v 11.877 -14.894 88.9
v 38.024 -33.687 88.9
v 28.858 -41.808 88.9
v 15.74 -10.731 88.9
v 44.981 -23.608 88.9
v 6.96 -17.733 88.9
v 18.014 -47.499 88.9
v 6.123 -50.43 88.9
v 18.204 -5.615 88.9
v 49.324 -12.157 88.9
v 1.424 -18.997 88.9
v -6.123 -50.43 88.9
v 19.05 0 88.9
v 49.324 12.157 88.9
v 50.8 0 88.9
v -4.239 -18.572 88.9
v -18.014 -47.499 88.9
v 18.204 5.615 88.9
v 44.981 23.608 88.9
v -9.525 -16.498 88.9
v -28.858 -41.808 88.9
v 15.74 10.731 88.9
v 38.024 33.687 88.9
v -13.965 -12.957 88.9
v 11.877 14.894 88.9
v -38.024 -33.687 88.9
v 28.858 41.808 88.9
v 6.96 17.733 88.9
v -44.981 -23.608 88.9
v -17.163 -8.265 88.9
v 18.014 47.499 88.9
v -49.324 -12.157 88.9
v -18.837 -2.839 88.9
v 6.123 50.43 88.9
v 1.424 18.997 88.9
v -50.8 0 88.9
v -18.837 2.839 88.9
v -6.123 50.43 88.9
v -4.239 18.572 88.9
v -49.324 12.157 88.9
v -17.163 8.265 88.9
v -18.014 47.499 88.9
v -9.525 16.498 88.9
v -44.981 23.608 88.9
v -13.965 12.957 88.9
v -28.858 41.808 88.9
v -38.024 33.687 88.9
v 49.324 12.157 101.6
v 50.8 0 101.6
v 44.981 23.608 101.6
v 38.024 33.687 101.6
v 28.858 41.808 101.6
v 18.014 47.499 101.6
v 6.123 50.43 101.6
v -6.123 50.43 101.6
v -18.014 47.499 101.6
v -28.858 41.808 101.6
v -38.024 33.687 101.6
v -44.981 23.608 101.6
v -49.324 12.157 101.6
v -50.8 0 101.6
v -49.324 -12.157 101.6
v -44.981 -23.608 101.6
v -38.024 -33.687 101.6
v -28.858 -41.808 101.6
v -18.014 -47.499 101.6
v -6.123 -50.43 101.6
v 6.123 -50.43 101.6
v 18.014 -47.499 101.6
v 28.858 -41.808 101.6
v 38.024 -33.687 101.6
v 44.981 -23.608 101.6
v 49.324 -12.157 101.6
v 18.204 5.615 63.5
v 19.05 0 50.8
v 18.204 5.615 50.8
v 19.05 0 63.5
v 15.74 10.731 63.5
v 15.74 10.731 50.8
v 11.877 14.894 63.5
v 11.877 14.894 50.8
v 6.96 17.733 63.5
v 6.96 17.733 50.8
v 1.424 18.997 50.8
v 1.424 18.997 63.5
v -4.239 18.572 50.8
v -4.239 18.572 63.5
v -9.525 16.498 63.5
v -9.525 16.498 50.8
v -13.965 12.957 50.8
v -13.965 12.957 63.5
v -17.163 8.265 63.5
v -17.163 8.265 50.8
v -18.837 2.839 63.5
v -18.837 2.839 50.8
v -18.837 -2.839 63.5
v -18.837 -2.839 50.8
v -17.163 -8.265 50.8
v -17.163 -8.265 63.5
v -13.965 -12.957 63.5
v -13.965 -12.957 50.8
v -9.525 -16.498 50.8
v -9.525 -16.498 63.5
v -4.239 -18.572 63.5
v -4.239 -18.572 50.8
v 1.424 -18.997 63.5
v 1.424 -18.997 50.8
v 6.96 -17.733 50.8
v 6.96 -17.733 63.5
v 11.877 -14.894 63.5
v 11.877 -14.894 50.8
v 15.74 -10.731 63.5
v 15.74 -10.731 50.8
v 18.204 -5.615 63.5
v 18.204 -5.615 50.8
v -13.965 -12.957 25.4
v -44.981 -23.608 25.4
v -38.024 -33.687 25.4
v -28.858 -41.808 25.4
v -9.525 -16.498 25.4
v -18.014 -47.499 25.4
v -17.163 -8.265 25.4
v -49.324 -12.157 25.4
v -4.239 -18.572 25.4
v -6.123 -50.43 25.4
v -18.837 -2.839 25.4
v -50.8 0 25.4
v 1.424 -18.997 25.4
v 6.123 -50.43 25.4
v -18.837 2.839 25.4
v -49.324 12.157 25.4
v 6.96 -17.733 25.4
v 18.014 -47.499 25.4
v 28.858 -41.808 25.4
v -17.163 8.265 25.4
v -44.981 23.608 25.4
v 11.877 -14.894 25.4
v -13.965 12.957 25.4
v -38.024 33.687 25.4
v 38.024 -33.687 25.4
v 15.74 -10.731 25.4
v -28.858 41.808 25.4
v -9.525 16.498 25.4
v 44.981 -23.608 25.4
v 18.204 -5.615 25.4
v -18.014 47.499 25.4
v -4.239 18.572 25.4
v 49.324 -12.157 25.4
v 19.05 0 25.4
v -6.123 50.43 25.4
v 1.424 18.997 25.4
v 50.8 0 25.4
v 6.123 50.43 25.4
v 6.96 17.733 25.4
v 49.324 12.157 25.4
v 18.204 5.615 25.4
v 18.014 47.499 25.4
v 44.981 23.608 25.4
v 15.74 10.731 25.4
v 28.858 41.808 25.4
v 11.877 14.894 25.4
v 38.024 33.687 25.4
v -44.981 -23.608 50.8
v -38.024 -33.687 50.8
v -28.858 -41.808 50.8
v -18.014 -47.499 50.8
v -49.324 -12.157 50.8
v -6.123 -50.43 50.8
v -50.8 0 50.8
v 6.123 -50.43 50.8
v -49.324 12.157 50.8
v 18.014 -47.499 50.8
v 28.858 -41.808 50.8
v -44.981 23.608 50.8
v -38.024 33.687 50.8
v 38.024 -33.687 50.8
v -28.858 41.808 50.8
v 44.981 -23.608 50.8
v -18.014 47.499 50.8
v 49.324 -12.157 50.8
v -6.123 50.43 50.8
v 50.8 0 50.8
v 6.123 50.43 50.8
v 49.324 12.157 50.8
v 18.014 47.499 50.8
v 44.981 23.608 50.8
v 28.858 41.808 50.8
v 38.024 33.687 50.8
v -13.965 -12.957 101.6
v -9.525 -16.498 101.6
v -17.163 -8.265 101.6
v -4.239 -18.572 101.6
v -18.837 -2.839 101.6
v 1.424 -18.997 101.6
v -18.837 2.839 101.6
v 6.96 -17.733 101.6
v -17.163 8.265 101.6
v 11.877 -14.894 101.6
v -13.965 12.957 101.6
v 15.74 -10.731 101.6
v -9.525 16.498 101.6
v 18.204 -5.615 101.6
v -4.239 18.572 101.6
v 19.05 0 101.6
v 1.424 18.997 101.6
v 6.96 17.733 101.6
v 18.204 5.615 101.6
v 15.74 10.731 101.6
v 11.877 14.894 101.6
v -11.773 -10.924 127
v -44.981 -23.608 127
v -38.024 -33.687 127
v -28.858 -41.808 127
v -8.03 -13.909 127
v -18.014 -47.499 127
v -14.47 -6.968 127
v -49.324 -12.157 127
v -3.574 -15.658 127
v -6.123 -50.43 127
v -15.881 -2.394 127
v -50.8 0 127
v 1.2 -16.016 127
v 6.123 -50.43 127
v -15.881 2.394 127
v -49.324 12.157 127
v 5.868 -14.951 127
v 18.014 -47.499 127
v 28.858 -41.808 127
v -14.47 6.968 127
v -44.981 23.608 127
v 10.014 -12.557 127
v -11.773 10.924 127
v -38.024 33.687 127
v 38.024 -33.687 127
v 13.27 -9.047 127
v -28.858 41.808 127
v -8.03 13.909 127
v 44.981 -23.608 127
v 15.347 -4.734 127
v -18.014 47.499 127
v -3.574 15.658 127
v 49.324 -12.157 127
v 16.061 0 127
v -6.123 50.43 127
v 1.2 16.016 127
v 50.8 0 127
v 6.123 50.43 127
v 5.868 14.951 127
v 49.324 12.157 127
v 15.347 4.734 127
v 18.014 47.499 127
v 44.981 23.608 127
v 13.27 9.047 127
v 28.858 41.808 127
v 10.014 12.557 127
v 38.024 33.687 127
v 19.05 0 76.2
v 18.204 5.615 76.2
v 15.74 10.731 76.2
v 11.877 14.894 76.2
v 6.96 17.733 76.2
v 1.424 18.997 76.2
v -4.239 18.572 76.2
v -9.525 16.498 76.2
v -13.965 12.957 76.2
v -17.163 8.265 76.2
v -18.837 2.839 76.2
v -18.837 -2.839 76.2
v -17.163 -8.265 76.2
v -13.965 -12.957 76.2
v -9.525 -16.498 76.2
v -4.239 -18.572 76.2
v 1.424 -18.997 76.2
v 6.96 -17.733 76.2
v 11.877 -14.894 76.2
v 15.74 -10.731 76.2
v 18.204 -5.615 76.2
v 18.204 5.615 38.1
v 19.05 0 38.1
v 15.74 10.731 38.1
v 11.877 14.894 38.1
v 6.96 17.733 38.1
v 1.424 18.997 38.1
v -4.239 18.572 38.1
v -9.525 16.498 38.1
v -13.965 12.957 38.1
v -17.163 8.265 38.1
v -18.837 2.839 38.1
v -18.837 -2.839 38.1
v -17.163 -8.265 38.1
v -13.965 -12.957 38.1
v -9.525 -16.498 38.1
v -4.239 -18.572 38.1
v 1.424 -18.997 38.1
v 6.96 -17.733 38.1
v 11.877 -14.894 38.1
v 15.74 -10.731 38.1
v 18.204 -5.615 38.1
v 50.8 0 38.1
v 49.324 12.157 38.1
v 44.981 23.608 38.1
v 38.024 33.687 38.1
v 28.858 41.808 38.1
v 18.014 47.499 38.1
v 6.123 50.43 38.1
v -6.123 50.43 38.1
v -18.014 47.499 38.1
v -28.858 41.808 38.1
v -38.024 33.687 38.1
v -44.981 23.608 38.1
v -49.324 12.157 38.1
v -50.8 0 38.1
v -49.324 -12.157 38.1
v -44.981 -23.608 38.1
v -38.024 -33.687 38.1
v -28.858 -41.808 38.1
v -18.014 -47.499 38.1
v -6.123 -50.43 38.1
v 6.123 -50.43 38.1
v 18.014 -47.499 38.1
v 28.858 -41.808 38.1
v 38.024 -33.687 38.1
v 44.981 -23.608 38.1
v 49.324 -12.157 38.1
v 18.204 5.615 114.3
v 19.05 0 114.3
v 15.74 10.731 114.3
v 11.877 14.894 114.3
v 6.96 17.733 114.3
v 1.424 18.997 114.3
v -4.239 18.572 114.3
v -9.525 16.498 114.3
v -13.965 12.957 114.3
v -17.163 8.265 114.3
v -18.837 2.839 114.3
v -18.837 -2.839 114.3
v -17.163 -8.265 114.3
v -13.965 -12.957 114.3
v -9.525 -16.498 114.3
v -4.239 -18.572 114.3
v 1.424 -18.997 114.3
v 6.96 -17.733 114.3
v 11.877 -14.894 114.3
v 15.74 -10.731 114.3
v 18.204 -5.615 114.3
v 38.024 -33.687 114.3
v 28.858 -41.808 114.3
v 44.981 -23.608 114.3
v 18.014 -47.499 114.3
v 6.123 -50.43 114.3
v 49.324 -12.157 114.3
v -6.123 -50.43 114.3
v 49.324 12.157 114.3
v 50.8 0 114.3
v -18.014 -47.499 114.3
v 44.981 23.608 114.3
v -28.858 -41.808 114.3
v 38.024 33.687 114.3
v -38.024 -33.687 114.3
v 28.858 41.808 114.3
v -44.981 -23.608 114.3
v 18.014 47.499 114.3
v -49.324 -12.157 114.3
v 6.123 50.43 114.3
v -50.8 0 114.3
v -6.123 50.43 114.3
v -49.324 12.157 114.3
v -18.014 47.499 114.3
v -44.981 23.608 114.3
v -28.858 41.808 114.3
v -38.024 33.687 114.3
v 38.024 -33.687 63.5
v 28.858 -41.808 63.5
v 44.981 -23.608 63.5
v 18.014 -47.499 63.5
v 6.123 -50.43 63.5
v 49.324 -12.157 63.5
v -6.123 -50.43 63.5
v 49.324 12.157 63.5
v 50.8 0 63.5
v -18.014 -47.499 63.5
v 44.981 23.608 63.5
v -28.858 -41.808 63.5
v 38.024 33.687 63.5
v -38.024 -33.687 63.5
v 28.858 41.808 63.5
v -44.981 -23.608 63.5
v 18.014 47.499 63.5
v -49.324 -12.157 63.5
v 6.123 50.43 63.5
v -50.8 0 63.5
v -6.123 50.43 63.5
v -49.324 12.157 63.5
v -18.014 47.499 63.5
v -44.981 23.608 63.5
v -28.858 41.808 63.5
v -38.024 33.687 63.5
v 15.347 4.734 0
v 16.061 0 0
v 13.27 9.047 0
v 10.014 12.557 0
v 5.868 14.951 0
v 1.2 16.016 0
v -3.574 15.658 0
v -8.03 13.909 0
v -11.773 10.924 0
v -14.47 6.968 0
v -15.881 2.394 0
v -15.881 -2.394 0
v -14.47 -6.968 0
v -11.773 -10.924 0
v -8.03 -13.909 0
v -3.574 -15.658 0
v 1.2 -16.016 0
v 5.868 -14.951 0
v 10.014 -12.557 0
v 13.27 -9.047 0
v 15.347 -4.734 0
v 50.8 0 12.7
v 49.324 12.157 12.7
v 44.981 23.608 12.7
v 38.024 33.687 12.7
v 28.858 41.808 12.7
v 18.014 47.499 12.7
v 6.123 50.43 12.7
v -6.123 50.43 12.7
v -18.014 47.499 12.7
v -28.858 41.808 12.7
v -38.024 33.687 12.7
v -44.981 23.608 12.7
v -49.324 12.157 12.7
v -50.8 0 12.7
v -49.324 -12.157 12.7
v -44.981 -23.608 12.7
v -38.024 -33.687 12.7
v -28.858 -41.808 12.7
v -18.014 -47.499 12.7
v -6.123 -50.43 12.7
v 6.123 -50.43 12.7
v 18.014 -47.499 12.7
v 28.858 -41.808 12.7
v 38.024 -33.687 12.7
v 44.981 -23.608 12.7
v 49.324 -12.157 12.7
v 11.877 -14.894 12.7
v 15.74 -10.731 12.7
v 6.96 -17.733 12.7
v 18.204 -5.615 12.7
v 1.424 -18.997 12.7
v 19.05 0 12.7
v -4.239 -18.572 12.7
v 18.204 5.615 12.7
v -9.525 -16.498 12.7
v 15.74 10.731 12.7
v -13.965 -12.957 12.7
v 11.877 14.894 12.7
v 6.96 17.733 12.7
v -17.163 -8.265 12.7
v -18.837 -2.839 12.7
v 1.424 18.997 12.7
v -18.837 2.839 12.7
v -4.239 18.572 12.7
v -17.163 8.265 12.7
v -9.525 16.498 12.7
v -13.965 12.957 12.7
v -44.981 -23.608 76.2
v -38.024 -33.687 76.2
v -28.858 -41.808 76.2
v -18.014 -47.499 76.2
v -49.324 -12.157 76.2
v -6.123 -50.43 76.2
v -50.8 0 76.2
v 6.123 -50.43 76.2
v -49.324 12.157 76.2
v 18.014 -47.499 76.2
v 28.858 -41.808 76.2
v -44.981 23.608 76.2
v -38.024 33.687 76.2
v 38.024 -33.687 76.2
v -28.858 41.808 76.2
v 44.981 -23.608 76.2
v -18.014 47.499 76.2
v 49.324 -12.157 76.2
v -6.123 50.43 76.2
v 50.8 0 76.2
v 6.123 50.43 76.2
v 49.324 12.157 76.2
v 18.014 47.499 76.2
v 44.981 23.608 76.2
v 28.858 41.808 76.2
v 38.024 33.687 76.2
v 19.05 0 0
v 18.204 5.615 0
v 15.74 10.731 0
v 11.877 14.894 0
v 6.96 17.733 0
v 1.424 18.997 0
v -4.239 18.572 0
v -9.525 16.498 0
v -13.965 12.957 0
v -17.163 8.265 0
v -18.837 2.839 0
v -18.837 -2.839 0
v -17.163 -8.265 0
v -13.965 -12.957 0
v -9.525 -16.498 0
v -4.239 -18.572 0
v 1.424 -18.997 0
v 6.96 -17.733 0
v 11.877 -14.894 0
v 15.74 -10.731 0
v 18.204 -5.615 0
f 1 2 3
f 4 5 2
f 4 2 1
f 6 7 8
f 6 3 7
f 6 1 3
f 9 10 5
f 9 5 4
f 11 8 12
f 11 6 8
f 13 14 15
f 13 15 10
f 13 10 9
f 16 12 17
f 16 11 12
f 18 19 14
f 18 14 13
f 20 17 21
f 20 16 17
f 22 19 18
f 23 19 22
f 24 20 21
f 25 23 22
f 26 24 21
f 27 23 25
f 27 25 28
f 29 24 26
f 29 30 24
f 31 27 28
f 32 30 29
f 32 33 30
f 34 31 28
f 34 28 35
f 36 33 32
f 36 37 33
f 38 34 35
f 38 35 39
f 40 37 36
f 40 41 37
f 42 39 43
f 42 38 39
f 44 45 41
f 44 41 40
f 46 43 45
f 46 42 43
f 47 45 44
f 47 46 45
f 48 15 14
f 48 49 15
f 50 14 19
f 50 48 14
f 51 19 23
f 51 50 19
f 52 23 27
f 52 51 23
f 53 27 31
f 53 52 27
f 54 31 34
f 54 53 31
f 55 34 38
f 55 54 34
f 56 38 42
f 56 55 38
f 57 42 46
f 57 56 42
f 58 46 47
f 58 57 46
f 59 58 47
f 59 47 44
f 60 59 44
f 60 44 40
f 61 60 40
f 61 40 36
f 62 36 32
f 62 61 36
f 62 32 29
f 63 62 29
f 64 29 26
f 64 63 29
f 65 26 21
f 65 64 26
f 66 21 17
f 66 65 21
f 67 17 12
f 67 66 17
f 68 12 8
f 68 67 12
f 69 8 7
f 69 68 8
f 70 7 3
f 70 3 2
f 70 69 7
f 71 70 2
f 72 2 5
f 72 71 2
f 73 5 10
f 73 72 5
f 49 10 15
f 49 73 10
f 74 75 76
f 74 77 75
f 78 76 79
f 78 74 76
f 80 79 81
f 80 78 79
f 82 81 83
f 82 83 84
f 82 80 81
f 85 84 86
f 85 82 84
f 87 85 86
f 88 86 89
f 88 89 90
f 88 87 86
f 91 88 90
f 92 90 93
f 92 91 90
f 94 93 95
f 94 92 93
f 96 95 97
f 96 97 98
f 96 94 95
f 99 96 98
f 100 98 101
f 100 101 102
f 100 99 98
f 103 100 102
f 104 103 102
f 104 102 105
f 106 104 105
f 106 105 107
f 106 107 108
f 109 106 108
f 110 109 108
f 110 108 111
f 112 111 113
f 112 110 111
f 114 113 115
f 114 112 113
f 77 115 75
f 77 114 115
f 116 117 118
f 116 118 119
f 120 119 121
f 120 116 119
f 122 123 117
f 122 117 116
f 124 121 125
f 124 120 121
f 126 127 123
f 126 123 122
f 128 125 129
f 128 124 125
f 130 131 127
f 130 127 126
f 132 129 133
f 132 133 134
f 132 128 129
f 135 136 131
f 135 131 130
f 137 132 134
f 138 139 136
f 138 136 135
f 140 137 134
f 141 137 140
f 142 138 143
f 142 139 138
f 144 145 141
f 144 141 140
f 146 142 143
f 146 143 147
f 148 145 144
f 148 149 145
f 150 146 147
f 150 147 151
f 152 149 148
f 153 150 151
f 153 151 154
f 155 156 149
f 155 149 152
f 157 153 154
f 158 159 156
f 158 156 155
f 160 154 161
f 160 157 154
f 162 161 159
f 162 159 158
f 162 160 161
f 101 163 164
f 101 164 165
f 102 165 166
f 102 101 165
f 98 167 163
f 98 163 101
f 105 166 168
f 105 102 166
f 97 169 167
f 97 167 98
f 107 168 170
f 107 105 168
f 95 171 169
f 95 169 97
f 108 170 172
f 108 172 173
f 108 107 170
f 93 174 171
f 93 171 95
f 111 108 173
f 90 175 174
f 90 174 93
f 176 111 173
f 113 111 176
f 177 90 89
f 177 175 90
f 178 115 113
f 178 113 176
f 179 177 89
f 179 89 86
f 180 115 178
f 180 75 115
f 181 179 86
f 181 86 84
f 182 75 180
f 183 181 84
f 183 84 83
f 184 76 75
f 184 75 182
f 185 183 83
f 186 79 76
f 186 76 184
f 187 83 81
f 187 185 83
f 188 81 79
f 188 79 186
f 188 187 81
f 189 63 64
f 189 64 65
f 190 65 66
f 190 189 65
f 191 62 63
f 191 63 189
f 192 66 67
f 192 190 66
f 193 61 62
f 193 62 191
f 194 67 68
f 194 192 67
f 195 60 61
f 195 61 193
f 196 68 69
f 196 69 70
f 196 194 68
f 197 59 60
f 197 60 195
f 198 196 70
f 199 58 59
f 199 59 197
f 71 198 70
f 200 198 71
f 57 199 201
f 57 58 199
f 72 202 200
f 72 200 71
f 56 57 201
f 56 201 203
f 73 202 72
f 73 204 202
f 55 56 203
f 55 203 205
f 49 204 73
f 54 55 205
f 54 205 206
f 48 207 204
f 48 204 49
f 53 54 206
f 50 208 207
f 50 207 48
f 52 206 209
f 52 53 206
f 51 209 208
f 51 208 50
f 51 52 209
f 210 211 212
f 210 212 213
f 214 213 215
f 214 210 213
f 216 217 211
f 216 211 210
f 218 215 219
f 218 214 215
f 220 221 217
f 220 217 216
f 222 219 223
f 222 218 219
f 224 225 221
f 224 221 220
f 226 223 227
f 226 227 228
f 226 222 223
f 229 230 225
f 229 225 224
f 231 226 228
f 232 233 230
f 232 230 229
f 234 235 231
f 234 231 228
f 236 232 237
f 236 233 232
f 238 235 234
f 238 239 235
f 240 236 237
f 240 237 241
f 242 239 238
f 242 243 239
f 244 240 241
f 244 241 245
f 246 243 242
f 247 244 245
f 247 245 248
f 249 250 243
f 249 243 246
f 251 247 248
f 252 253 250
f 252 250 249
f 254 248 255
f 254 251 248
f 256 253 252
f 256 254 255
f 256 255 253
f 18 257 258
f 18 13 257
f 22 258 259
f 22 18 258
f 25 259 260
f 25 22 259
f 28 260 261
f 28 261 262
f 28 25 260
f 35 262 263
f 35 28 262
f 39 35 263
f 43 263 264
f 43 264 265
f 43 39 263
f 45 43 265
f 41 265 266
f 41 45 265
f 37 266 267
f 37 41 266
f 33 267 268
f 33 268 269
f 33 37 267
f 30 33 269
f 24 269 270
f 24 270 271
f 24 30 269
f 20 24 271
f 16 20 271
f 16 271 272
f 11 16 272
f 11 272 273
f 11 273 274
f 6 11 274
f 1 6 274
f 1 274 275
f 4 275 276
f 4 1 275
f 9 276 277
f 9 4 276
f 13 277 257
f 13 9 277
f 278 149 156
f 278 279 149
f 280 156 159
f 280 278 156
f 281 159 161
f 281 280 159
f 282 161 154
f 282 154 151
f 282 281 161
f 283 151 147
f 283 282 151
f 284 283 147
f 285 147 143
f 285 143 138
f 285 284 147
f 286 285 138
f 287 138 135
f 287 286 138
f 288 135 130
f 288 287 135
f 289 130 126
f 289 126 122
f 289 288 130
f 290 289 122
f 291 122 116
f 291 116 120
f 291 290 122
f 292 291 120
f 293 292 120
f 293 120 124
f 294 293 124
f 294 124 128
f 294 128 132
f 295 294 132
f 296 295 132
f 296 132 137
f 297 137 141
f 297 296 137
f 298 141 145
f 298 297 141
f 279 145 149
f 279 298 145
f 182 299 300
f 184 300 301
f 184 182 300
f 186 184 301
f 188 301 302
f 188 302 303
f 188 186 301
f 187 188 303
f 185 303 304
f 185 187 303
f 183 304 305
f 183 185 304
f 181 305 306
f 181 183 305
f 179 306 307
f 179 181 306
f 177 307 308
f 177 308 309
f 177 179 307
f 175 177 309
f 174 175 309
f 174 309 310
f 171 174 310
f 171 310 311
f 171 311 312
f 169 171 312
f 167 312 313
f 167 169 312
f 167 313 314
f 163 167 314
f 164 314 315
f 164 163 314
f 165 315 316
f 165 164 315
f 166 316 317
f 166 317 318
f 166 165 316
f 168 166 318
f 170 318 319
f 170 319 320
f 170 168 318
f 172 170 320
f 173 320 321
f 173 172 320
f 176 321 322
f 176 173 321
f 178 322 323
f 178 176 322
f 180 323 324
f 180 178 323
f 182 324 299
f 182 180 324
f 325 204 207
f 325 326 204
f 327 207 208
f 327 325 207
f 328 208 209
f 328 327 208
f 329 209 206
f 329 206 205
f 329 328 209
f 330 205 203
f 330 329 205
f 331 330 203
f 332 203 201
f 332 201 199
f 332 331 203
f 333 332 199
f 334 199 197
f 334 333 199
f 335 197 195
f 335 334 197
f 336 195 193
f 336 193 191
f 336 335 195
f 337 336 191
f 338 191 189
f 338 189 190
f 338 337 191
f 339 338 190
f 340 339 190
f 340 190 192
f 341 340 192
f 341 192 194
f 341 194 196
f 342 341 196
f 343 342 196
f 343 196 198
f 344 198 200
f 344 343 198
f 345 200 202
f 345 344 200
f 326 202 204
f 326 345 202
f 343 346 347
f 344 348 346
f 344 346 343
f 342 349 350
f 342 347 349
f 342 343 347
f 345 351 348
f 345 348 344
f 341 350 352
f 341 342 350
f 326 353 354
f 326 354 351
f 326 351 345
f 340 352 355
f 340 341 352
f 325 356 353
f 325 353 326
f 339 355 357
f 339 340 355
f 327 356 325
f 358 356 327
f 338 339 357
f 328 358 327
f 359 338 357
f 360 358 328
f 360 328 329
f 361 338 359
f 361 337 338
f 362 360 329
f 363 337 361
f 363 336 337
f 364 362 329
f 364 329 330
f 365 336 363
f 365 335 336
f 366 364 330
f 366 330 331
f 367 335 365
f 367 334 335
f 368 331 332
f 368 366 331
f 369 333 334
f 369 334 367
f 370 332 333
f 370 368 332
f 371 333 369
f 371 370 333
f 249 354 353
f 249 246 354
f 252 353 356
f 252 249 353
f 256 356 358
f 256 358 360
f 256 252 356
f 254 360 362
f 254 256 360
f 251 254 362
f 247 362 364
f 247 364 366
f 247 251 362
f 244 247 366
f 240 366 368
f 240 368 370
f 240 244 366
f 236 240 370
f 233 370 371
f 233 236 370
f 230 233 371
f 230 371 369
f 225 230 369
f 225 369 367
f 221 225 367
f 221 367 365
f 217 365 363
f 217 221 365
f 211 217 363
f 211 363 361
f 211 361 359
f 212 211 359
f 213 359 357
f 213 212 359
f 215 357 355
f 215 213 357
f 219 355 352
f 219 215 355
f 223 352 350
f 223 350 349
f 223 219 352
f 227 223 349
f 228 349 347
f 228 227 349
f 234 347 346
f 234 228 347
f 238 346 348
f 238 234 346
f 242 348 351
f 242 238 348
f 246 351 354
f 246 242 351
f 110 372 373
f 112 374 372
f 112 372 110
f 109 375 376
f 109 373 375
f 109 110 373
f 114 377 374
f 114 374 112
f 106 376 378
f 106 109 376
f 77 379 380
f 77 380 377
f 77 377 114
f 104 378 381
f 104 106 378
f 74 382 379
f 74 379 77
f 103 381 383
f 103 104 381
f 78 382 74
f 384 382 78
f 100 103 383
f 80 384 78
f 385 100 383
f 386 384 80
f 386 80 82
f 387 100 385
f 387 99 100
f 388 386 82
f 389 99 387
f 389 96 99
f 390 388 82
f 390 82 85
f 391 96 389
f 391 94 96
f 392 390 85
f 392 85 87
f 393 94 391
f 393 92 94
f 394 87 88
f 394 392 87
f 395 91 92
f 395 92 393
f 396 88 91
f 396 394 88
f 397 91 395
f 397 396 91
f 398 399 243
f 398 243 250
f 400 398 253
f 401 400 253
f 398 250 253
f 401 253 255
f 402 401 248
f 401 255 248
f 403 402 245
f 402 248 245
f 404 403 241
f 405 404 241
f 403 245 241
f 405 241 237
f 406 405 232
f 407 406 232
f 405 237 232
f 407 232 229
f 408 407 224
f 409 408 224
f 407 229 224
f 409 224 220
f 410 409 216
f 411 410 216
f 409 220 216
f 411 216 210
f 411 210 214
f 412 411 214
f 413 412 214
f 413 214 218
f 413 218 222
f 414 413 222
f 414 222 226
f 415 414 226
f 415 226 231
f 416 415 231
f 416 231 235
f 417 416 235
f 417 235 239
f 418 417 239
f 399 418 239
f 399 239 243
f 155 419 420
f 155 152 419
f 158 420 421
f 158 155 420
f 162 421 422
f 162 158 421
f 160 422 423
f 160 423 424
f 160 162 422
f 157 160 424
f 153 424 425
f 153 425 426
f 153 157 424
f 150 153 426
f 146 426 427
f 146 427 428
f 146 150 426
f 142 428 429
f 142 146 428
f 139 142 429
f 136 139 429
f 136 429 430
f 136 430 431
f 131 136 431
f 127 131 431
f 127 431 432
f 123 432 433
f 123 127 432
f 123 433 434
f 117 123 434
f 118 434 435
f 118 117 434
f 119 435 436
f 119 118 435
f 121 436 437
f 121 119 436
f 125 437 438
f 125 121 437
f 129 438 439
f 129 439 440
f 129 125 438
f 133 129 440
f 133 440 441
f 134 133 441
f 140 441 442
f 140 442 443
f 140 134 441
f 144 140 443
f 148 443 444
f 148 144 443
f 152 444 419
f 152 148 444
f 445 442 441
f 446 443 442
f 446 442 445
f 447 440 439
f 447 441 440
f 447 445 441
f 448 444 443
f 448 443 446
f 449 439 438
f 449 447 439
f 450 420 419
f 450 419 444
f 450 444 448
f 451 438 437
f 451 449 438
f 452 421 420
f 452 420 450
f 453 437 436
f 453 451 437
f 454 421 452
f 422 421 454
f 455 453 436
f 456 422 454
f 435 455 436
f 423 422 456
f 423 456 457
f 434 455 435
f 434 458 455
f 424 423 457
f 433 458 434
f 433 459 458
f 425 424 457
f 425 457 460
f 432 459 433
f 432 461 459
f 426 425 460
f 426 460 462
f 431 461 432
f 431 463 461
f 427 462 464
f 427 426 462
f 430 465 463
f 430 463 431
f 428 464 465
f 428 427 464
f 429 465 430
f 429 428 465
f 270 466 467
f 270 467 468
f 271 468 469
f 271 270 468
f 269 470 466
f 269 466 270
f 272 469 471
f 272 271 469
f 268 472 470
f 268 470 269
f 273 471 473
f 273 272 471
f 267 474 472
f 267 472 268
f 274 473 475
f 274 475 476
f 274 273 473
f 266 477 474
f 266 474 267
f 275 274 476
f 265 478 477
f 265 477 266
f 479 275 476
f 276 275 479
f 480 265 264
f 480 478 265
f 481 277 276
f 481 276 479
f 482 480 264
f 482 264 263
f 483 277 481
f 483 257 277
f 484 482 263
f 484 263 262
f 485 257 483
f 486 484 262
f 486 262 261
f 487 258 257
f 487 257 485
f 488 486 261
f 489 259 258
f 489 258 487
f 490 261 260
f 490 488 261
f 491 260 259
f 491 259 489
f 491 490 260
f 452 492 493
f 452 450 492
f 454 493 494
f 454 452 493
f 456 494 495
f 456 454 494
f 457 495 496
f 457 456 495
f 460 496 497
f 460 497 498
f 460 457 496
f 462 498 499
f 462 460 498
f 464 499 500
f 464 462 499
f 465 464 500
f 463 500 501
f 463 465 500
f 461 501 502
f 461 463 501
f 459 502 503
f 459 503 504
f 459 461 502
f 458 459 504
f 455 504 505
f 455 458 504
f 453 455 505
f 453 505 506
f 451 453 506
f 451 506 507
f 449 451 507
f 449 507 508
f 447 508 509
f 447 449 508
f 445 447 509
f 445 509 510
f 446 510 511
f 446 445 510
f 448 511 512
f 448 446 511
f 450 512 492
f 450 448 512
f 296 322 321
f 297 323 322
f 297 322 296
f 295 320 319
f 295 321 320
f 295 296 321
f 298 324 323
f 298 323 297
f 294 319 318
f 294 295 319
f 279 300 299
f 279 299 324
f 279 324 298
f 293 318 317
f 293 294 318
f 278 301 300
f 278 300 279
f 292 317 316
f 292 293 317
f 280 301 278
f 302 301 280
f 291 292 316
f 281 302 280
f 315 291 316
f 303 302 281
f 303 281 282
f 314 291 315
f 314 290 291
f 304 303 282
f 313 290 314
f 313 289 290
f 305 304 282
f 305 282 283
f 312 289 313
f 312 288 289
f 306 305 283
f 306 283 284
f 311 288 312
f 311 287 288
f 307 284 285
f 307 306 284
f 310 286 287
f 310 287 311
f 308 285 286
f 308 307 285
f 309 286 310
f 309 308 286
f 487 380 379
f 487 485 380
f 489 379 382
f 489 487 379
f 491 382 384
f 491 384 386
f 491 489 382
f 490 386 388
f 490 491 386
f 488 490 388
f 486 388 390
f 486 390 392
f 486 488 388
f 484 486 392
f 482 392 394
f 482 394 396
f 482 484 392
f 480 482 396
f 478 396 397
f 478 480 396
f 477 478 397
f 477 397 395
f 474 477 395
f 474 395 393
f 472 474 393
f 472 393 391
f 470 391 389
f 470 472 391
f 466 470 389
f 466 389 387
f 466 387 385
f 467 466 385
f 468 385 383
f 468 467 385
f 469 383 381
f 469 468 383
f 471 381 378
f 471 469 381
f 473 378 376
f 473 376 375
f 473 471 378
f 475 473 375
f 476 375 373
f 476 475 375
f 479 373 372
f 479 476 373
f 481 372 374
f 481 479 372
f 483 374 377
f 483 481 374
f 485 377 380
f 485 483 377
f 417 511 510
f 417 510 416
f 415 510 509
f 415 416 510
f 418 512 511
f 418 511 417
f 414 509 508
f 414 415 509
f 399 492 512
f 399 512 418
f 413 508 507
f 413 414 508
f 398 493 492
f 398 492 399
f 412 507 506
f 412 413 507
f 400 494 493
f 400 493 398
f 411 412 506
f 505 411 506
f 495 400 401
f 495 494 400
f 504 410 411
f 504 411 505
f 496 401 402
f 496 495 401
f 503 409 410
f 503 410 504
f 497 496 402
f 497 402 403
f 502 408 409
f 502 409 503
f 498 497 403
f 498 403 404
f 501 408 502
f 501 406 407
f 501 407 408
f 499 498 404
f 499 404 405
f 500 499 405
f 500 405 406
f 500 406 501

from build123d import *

# Parameters (mm, degrees)
F3_R     = 18.2754285366
F4_DEPTH = 251
F5_R     = 16.060733565
F6_DEPTH = 127.001


# Not quite as in the source:
# - an extrude ends at something that could not be found from the text; its depth is read off the source's solid


with BuildPart() as f1:
    # F0 (on Front) → F1 (revolve)
    with BuildSketch(Plane.XZ):
        Polygon((0, 127), (0, 0), (19.05, 0), (19.05, 12.7), (50.8, 12.7), (50.8, 25.4), (19.05, 25.4), (19.05, 38.1), (50.8, 38.1), (50.8, 50.8), (19.05, 50.8), (19.05, 63.5), (50.8, 63.5), (50.8, 76.2), (19.05, 76.2), (19.05, 88.9), (50.8, 88.9), (50.8, 101.6), (19.05, 101.6), (19.05, 114.3), (50.8, 114.3), (50.8, 127), align=None)
    revolve(axis=Axis((0, 0, 63.5), (0, 0, 1)))

    # F3 (on face) → F4 (cut, through all)
    with BuildSketch(Plane.XY.offset(127)):
        Circle(F3_R)
    extrude(amount=F4_DEPTH, mode=Mode.SUBTRACT)

    # F5 (on face) → F6 (cut, through all)
    with BuildSketch(Plane.XY.offset(127)):
        Circle(F5_R)
    extrude(amount=-F6_DEPTH, mode=Mode.SUBTRACT)


solid = f1.part
